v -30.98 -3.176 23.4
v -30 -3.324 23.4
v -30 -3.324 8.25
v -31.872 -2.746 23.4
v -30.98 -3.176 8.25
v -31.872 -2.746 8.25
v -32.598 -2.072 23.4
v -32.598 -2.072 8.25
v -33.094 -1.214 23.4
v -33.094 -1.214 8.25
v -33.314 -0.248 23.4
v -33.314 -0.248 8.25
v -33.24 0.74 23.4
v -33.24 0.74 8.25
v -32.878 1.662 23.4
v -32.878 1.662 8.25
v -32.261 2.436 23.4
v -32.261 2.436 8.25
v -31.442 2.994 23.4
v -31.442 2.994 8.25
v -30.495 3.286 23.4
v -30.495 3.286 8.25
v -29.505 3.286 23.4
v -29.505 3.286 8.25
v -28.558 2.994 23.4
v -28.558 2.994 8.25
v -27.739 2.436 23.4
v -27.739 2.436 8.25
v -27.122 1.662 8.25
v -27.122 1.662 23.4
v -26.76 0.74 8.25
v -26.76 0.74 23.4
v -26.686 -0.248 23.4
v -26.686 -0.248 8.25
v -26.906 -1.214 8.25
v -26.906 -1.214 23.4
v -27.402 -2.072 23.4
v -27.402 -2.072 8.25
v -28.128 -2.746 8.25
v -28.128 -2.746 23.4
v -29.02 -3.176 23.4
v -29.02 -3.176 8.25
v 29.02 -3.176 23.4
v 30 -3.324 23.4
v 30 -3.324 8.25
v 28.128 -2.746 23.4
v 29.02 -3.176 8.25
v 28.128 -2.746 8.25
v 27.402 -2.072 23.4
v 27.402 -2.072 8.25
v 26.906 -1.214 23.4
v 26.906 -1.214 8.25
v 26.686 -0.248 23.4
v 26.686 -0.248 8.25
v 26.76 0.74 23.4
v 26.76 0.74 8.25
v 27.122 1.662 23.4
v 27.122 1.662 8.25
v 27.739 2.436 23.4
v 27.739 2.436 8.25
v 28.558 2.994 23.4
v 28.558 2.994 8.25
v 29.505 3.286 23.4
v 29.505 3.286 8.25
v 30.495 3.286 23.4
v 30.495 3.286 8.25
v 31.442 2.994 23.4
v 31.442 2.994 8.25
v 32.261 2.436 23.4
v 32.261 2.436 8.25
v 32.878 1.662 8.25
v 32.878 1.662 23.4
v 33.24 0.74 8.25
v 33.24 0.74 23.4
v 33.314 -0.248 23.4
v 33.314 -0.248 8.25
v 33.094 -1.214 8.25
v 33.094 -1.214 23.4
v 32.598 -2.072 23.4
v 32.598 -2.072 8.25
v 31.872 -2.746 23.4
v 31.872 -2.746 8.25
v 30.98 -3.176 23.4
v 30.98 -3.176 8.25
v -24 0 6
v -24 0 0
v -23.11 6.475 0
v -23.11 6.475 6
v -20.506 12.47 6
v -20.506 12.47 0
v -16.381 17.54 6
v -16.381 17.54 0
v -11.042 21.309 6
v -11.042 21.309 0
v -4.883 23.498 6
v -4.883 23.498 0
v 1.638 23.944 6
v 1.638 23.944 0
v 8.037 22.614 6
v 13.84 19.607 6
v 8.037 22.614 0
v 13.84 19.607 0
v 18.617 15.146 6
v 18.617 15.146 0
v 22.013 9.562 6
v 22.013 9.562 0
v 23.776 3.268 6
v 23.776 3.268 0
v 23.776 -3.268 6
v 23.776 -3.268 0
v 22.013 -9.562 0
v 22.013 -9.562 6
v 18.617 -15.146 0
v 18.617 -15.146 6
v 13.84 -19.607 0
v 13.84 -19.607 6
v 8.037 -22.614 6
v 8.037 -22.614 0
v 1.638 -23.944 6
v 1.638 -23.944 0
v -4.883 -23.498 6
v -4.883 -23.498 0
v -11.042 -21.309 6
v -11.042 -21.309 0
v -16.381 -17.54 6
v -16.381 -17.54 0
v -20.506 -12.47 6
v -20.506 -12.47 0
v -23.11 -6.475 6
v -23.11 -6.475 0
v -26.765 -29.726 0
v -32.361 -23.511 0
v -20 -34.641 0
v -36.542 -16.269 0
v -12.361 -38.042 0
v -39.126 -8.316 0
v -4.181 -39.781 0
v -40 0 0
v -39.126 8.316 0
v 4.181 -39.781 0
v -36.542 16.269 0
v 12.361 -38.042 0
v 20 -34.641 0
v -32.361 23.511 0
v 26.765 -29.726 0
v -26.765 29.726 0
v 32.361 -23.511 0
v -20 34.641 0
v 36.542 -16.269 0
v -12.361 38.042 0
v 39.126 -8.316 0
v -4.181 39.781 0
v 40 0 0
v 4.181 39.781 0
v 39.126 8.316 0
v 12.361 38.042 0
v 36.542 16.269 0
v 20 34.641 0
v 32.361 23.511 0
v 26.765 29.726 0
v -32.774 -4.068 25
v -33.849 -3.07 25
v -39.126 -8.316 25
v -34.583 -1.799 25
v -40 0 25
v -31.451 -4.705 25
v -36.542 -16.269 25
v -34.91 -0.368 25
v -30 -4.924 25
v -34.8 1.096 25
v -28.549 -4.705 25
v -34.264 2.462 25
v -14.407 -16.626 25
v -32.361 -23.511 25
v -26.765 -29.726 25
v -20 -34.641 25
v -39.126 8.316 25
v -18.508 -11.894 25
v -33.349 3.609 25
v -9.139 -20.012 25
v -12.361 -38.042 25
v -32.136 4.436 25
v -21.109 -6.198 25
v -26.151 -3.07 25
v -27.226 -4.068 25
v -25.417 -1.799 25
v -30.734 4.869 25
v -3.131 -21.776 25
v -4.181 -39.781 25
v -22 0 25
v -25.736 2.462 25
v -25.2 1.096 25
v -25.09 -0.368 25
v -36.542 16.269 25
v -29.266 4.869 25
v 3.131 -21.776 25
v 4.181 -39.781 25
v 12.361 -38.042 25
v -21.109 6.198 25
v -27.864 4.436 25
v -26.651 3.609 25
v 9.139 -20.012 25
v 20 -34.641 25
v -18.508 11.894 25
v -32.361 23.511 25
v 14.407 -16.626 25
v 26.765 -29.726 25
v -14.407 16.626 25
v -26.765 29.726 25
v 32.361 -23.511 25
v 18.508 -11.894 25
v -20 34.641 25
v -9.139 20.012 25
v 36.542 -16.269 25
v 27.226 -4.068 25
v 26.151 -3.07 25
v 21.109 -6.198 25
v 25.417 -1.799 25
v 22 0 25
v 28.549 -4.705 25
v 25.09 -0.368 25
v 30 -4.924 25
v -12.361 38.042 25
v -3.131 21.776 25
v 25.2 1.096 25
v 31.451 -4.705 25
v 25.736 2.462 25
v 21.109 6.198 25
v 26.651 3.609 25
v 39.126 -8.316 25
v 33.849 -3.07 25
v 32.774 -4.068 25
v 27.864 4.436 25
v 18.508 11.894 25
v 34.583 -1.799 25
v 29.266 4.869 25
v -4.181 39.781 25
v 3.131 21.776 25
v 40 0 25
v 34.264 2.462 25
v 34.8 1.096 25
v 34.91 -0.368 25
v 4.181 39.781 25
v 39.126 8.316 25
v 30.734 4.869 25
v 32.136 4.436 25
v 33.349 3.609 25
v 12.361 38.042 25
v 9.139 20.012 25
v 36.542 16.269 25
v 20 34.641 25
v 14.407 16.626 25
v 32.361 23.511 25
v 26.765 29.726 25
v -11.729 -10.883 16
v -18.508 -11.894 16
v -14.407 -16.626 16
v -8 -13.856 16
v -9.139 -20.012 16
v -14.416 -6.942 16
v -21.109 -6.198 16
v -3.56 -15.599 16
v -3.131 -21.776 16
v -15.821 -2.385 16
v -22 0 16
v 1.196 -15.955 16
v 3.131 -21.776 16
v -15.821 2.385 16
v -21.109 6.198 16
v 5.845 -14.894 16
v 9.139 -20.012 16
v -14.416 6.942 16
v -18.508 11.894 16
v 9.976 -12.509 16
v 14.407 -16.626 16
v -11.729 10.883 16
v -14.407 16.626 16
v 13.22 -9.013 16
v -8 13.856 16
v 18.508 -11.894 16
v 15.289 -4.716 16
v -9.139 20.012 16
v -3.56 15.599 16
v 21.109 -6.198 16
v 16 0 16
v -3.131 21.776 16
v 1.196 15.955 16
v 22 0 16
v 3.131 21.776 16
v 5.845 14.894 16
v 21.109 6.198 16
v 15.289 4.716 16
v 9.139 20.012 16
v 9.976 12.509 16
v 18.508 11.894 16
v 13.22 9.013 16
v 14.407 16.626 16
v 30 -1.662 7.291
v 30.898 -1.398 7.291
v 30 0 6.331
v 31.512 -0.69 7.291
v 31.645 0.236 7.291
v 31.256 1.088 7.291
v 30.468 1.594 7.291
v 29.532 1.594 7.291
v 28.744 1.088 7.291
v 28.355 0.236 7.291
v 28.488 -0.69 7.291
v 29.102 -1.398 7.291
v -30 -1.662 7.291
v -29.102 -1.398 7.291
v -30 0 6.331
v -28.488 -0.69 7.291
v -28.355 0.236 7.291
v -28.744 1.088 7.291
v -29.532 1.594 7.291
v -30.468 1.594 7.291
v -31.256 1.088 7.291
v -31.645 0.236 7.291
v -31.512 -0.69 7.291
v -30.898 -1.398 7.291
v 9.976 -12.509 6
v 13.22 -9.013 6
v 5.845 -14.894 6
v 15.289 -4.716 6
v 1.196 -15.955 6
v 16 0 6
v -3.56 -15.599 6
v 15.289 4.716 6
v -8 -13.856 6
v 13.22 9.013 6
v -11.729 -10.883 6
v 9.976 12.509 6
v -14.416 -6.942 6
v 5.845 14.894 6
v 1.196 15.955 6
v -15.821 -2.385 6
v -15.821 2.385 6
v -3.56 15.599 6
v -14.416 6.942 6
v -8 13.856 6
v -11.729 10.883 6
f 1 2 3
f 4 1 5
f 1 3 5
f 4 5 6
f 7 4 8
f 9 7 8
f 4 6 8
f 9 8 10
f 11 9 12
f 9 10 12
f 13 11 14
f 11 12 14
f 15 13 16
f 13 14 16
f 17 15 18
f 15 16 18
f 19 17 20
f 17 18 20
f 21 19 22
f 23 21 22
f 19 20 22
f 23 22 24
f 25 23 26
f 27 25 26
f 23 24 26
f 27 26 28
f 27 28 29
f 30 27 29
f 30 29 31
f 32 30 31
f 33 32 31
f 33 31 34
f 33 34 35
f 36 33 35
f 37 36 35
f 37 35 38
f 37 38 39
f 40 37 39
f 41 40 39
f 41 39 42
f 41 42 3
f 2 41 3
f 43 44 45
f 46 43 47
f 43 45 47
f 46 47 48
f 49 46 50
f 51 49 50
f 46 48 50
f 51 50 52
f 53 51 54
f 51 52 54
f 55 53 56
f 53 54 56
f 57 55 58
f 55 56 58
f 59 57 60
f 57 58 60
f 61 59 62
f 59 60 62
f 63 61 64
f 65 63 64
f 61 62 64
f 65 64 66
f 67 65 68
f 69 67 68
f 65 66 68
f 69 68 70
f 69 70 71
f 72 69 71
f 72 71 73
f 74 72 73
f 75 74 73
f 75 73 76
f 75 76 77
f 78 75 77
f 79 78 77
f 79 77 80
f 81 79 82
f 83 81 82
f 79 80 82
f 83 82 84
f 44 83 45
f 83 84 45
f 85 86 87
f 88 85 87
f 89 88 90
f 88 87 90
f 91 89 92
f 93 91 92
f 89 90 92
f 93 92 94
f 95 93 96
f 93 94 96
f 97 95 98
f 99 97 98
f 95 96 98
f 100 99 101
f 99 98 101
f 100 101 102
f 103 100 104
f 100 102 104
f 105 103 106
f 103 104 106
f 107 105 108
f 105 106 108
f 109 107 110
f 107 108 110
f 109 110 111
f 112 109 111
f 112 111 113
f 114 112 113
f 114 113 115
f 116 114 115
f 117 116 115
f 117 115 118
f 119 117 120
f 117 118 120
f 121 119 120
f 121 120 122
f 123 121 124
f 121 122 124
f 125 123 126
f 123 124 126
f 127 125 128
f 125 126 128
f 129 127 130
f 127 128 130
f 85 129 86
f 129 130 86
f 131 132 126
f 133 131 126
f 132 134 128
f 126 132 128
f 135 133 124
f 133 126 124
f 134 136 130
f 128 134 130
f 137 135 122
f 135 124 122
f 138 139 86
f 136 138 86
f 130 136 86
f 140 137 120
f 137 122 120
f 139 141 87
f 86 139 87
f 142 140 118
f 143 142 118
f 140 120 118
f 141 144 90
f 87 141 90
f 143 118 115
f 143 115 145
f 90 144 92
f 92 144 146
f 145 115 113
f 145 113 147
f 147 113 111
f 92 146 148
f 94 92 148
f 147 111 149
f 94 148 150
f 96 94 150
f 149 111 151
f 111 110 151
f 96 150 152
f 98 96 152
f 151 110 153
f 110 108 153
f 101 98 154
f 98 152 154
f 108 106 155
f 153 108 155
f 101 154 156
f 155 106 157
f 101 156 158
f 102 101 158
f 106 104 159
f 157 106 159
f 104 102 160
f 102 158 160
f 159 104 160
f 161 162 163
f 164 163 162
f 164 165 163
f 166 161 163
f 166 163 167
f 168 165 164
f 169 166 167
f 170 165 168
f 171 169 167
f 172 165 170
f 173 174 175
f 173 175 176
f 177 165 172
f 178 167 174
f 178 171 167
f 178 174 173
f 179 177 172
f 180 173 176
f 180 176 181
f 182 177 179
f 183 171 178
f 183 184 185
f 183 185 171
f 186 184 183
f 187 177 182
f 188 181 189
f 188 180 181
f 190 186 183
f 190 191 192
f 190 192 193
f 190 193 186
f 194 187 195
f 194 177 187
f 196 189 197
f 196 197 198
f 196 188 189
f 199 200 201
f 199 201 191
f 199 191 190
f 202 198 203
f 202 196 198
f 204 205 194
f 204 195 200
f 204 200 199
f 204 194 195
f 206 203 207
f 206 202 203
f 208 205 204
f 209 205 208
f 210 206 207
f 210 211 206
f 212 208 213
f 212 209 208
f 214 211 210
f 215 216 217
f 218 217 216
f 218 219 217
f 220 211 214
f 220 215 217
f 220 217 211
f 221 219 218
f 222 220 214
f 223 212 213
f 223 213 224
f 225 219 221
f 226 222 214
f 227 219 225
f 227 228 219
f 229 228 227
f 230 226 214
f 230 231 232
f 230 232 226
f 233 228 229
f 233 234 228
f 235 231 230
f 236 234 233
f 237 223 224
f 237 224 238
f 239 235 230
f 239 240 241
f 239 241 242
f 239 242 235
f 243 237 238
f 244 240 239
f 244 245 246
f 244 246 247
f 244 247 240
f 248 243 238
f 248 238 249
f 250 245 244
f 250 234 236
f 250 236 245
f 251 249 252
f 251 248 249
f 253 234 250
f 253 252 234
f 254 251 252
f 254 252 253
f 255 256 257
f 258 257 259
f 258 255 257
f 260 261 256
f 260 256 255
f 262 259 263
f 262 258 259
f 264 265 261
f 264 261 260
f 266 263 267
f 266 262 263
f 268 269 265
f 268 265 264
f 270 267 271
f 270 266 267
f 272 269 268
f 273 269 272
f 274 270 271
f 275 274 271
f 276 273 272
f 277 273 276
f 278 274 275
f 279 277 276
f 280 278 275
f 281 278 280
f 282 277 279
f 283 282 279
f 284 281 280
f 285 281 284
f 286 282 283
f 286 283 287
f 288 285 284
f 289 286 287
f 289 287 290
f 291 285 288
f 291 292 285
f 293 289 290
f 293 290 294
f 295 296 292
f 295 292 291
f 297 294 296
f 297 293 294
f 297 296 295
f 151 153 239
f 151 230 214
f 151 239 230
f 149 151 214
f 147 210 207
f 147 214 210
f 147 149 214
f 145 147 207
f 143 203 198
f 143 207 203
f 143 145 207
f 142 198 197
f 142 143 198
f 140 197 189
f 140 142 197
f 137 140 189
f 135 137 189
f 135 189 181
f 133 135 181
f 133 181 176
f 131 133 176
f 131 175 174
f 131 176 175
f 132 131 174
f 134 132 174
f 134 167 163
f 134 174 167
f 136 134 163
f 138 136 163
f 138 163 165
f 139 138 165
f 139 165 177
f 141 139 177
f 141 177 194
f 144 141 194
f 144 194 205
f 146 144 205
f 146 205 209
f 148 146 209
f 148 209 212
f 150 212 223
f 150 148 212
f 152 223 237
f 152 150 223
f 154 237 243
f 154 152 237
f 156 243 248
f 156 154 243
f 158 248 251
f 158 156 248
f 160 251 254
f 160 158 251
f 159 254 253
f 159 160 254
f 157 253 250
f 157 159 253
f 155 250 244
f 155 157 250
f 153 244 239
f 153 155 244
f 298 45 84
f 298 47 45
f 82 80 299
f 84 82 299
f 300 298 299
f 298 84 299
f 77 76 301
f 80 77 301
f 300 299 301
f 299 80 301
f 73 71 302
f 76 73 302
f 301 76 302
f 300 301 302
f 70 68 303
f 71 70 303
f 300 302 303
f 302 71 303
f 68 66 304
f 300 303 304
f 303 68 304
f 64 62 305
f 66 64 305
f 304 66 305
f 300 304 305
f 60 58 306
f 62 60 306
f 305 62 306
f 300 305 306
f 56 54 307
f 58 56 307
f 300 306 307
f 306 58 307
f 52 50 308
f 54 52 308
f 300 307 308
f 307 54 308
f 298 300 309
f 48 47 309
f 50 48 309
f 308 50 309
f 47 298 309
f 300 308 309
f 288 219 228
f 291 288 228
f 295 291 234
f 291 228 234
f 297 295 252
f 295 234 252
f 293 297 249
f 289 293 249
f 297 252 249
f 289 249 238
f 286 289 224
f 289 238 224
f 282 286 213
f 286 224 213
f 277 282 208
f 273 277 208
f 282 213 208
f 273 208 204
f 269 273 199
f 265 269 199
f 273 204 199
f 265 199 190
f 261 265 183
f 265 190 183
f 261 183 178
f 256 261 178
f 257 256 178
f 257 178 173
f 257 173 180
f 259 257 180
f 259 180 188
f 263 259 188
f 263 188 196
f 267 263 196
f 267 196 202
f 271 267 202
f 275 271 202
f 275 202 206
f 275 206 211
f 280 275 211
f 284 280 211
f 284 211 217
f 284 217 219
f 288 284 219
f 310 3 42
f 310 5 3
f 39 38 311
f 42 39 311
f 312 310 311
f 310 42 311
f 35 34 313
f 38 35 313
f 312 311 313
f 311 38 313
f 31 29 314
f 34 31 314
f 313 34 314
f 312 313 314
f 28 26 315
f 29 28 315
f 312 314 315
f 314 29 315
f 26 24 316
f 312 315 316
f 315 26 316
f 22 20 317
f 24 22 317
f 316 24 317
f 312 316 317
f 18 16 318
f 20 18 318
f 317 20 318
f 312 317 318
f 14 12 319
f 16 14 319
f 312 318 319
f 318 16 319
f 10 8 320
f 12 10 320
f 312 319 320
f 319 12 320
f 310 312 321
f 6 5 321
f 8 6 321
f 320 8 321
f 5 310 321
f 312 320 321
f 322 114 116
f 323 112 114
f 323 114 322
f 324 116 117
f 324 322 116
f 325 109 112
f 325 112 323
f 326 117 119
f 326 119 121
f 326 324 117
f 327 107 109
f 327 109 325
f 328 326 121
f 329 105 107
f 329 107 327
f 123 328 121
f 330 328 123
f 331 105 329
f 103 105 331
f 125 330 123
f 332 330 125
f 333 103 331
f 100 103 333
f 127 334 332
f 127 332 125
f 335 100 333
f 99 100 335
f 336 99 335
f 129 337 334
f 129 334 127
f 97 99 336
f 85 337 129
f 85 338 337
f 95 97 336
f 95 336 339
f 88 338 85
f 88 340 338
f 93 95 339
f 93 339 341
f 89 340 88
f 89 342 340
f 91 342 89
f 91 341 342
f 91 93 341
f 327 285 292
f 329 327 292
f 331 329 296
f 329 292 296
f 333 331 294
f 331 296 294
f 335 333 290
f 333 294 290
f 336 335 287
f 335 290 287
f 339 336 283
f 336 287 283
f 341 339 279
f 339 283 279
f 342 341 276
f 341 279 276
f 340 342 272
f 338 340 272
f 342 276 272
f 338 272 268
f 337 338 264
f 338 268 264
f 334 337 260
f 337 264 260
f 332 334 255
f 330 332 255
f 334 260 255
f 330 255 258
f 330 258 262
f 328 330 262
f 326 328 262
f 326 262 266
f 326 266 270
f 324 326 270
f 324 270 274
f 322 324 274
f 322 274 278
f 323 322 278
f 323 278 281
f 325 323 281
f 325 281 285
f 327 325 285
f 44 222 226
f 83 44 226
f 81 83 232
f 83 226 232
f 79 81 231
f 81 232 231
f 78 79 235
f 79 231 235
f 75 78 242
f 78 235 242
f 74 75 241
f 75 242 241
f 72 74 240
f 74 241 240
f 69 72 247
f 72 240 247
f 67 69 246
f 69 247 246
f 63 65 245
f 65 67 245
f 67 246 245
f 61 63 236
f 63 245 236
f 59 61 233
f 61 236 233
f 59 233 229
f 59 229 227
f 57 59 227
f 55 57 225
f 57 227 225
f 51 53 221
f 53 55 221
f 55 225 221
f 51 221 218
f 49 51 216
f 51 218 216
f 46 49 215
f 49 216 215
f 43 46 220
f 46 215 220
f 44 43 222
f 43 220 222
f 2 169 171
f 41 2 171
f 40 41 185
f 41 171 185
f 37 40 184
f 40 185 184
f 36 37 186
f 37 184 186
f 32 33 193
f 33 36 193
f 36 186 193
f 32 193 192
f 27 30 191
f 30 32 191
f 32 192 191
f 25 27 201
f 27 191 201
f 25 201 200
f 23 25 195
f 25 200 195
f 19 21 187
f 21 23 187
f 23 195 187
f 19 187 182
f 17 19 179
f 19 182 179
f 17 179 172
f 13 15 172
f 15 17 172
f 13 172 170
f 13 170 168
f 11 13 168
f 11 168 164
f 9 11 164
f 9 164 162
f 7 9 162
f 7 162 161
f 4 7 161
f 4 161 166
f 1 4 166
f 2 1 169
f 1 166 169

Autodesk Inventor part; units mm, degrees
ref_plane "YZ Plane" through (0, 0, 0) normal (1, 0, 0) x (0, 1, 0)
ref_plane "XZ Plane" through (0, 0, 0) normal (0, 1, 0) x (-1, 0, 0)
ref_plane "XY Plane" through (0, 0, 0) normal (0, 0, 1) x (1, 0, 0)
sketch "Эскиз1" plane through (0, 0, 0) normal (0, 0, 1) x (1, 0, 0)
  circle A0 centre (0, 0) radius 40
  dimension "d0" = 80
extrude "Выдавливание1" add sketch "Эскиз1" along normal blind 25
sketch "Эскиз2" plane through (0, 0, 25) normal (0, 0, 1) x (1, 0, 0)
  point P0 (0, 0)
  point P1 (-30, 0)
  point P2 (30, 0)
  dimension "d3" = 30
  dimension "d4" = 60
hole "Отверстие1" at (-30, 0, 25) at (30, 0, 25) direction (0, 0, -1) diameter 6.647 depth 16.75 tip angle 120 thread size "M8x1.25" class "6H" standard "ANSI Metric M Profile"
chamfer "Фаска1" distance 1.6 angle 45 2 edges at (-30, 3.3235, 25) (30, 3.3235, 25)
sketch "Эскиз3" plane through (0, 0, 25) normal (0, 0, 1) x (1, 0, 0)
  circle A0 centre (0, 0) radius 22
  dimension "d15" = 44
extrude "Выдавливание2" cut sketch "Эскиз3" against normal blind 9
sketch "Эскиз4" plane through (0, 0, 16) normal (0, 0, 1) x (1, 0, 0)
  circle A0 centre (0, 0) radius 16
  dimension "d18" = 32
extrude "Выдавливание3" cut sketch "Эскиз4" against normal through all
sketch "Эскиз5" plane through (0, 0, 0) normal (0, 0, -1) x (-1, 0, 0)
  circle A0 centre (0, 0) radius 24
  dimension "d21" = 48
extrude "Выдавливание4" cut sketch "Эскиз5" against normal blind 6
properties part number "Корпус"
